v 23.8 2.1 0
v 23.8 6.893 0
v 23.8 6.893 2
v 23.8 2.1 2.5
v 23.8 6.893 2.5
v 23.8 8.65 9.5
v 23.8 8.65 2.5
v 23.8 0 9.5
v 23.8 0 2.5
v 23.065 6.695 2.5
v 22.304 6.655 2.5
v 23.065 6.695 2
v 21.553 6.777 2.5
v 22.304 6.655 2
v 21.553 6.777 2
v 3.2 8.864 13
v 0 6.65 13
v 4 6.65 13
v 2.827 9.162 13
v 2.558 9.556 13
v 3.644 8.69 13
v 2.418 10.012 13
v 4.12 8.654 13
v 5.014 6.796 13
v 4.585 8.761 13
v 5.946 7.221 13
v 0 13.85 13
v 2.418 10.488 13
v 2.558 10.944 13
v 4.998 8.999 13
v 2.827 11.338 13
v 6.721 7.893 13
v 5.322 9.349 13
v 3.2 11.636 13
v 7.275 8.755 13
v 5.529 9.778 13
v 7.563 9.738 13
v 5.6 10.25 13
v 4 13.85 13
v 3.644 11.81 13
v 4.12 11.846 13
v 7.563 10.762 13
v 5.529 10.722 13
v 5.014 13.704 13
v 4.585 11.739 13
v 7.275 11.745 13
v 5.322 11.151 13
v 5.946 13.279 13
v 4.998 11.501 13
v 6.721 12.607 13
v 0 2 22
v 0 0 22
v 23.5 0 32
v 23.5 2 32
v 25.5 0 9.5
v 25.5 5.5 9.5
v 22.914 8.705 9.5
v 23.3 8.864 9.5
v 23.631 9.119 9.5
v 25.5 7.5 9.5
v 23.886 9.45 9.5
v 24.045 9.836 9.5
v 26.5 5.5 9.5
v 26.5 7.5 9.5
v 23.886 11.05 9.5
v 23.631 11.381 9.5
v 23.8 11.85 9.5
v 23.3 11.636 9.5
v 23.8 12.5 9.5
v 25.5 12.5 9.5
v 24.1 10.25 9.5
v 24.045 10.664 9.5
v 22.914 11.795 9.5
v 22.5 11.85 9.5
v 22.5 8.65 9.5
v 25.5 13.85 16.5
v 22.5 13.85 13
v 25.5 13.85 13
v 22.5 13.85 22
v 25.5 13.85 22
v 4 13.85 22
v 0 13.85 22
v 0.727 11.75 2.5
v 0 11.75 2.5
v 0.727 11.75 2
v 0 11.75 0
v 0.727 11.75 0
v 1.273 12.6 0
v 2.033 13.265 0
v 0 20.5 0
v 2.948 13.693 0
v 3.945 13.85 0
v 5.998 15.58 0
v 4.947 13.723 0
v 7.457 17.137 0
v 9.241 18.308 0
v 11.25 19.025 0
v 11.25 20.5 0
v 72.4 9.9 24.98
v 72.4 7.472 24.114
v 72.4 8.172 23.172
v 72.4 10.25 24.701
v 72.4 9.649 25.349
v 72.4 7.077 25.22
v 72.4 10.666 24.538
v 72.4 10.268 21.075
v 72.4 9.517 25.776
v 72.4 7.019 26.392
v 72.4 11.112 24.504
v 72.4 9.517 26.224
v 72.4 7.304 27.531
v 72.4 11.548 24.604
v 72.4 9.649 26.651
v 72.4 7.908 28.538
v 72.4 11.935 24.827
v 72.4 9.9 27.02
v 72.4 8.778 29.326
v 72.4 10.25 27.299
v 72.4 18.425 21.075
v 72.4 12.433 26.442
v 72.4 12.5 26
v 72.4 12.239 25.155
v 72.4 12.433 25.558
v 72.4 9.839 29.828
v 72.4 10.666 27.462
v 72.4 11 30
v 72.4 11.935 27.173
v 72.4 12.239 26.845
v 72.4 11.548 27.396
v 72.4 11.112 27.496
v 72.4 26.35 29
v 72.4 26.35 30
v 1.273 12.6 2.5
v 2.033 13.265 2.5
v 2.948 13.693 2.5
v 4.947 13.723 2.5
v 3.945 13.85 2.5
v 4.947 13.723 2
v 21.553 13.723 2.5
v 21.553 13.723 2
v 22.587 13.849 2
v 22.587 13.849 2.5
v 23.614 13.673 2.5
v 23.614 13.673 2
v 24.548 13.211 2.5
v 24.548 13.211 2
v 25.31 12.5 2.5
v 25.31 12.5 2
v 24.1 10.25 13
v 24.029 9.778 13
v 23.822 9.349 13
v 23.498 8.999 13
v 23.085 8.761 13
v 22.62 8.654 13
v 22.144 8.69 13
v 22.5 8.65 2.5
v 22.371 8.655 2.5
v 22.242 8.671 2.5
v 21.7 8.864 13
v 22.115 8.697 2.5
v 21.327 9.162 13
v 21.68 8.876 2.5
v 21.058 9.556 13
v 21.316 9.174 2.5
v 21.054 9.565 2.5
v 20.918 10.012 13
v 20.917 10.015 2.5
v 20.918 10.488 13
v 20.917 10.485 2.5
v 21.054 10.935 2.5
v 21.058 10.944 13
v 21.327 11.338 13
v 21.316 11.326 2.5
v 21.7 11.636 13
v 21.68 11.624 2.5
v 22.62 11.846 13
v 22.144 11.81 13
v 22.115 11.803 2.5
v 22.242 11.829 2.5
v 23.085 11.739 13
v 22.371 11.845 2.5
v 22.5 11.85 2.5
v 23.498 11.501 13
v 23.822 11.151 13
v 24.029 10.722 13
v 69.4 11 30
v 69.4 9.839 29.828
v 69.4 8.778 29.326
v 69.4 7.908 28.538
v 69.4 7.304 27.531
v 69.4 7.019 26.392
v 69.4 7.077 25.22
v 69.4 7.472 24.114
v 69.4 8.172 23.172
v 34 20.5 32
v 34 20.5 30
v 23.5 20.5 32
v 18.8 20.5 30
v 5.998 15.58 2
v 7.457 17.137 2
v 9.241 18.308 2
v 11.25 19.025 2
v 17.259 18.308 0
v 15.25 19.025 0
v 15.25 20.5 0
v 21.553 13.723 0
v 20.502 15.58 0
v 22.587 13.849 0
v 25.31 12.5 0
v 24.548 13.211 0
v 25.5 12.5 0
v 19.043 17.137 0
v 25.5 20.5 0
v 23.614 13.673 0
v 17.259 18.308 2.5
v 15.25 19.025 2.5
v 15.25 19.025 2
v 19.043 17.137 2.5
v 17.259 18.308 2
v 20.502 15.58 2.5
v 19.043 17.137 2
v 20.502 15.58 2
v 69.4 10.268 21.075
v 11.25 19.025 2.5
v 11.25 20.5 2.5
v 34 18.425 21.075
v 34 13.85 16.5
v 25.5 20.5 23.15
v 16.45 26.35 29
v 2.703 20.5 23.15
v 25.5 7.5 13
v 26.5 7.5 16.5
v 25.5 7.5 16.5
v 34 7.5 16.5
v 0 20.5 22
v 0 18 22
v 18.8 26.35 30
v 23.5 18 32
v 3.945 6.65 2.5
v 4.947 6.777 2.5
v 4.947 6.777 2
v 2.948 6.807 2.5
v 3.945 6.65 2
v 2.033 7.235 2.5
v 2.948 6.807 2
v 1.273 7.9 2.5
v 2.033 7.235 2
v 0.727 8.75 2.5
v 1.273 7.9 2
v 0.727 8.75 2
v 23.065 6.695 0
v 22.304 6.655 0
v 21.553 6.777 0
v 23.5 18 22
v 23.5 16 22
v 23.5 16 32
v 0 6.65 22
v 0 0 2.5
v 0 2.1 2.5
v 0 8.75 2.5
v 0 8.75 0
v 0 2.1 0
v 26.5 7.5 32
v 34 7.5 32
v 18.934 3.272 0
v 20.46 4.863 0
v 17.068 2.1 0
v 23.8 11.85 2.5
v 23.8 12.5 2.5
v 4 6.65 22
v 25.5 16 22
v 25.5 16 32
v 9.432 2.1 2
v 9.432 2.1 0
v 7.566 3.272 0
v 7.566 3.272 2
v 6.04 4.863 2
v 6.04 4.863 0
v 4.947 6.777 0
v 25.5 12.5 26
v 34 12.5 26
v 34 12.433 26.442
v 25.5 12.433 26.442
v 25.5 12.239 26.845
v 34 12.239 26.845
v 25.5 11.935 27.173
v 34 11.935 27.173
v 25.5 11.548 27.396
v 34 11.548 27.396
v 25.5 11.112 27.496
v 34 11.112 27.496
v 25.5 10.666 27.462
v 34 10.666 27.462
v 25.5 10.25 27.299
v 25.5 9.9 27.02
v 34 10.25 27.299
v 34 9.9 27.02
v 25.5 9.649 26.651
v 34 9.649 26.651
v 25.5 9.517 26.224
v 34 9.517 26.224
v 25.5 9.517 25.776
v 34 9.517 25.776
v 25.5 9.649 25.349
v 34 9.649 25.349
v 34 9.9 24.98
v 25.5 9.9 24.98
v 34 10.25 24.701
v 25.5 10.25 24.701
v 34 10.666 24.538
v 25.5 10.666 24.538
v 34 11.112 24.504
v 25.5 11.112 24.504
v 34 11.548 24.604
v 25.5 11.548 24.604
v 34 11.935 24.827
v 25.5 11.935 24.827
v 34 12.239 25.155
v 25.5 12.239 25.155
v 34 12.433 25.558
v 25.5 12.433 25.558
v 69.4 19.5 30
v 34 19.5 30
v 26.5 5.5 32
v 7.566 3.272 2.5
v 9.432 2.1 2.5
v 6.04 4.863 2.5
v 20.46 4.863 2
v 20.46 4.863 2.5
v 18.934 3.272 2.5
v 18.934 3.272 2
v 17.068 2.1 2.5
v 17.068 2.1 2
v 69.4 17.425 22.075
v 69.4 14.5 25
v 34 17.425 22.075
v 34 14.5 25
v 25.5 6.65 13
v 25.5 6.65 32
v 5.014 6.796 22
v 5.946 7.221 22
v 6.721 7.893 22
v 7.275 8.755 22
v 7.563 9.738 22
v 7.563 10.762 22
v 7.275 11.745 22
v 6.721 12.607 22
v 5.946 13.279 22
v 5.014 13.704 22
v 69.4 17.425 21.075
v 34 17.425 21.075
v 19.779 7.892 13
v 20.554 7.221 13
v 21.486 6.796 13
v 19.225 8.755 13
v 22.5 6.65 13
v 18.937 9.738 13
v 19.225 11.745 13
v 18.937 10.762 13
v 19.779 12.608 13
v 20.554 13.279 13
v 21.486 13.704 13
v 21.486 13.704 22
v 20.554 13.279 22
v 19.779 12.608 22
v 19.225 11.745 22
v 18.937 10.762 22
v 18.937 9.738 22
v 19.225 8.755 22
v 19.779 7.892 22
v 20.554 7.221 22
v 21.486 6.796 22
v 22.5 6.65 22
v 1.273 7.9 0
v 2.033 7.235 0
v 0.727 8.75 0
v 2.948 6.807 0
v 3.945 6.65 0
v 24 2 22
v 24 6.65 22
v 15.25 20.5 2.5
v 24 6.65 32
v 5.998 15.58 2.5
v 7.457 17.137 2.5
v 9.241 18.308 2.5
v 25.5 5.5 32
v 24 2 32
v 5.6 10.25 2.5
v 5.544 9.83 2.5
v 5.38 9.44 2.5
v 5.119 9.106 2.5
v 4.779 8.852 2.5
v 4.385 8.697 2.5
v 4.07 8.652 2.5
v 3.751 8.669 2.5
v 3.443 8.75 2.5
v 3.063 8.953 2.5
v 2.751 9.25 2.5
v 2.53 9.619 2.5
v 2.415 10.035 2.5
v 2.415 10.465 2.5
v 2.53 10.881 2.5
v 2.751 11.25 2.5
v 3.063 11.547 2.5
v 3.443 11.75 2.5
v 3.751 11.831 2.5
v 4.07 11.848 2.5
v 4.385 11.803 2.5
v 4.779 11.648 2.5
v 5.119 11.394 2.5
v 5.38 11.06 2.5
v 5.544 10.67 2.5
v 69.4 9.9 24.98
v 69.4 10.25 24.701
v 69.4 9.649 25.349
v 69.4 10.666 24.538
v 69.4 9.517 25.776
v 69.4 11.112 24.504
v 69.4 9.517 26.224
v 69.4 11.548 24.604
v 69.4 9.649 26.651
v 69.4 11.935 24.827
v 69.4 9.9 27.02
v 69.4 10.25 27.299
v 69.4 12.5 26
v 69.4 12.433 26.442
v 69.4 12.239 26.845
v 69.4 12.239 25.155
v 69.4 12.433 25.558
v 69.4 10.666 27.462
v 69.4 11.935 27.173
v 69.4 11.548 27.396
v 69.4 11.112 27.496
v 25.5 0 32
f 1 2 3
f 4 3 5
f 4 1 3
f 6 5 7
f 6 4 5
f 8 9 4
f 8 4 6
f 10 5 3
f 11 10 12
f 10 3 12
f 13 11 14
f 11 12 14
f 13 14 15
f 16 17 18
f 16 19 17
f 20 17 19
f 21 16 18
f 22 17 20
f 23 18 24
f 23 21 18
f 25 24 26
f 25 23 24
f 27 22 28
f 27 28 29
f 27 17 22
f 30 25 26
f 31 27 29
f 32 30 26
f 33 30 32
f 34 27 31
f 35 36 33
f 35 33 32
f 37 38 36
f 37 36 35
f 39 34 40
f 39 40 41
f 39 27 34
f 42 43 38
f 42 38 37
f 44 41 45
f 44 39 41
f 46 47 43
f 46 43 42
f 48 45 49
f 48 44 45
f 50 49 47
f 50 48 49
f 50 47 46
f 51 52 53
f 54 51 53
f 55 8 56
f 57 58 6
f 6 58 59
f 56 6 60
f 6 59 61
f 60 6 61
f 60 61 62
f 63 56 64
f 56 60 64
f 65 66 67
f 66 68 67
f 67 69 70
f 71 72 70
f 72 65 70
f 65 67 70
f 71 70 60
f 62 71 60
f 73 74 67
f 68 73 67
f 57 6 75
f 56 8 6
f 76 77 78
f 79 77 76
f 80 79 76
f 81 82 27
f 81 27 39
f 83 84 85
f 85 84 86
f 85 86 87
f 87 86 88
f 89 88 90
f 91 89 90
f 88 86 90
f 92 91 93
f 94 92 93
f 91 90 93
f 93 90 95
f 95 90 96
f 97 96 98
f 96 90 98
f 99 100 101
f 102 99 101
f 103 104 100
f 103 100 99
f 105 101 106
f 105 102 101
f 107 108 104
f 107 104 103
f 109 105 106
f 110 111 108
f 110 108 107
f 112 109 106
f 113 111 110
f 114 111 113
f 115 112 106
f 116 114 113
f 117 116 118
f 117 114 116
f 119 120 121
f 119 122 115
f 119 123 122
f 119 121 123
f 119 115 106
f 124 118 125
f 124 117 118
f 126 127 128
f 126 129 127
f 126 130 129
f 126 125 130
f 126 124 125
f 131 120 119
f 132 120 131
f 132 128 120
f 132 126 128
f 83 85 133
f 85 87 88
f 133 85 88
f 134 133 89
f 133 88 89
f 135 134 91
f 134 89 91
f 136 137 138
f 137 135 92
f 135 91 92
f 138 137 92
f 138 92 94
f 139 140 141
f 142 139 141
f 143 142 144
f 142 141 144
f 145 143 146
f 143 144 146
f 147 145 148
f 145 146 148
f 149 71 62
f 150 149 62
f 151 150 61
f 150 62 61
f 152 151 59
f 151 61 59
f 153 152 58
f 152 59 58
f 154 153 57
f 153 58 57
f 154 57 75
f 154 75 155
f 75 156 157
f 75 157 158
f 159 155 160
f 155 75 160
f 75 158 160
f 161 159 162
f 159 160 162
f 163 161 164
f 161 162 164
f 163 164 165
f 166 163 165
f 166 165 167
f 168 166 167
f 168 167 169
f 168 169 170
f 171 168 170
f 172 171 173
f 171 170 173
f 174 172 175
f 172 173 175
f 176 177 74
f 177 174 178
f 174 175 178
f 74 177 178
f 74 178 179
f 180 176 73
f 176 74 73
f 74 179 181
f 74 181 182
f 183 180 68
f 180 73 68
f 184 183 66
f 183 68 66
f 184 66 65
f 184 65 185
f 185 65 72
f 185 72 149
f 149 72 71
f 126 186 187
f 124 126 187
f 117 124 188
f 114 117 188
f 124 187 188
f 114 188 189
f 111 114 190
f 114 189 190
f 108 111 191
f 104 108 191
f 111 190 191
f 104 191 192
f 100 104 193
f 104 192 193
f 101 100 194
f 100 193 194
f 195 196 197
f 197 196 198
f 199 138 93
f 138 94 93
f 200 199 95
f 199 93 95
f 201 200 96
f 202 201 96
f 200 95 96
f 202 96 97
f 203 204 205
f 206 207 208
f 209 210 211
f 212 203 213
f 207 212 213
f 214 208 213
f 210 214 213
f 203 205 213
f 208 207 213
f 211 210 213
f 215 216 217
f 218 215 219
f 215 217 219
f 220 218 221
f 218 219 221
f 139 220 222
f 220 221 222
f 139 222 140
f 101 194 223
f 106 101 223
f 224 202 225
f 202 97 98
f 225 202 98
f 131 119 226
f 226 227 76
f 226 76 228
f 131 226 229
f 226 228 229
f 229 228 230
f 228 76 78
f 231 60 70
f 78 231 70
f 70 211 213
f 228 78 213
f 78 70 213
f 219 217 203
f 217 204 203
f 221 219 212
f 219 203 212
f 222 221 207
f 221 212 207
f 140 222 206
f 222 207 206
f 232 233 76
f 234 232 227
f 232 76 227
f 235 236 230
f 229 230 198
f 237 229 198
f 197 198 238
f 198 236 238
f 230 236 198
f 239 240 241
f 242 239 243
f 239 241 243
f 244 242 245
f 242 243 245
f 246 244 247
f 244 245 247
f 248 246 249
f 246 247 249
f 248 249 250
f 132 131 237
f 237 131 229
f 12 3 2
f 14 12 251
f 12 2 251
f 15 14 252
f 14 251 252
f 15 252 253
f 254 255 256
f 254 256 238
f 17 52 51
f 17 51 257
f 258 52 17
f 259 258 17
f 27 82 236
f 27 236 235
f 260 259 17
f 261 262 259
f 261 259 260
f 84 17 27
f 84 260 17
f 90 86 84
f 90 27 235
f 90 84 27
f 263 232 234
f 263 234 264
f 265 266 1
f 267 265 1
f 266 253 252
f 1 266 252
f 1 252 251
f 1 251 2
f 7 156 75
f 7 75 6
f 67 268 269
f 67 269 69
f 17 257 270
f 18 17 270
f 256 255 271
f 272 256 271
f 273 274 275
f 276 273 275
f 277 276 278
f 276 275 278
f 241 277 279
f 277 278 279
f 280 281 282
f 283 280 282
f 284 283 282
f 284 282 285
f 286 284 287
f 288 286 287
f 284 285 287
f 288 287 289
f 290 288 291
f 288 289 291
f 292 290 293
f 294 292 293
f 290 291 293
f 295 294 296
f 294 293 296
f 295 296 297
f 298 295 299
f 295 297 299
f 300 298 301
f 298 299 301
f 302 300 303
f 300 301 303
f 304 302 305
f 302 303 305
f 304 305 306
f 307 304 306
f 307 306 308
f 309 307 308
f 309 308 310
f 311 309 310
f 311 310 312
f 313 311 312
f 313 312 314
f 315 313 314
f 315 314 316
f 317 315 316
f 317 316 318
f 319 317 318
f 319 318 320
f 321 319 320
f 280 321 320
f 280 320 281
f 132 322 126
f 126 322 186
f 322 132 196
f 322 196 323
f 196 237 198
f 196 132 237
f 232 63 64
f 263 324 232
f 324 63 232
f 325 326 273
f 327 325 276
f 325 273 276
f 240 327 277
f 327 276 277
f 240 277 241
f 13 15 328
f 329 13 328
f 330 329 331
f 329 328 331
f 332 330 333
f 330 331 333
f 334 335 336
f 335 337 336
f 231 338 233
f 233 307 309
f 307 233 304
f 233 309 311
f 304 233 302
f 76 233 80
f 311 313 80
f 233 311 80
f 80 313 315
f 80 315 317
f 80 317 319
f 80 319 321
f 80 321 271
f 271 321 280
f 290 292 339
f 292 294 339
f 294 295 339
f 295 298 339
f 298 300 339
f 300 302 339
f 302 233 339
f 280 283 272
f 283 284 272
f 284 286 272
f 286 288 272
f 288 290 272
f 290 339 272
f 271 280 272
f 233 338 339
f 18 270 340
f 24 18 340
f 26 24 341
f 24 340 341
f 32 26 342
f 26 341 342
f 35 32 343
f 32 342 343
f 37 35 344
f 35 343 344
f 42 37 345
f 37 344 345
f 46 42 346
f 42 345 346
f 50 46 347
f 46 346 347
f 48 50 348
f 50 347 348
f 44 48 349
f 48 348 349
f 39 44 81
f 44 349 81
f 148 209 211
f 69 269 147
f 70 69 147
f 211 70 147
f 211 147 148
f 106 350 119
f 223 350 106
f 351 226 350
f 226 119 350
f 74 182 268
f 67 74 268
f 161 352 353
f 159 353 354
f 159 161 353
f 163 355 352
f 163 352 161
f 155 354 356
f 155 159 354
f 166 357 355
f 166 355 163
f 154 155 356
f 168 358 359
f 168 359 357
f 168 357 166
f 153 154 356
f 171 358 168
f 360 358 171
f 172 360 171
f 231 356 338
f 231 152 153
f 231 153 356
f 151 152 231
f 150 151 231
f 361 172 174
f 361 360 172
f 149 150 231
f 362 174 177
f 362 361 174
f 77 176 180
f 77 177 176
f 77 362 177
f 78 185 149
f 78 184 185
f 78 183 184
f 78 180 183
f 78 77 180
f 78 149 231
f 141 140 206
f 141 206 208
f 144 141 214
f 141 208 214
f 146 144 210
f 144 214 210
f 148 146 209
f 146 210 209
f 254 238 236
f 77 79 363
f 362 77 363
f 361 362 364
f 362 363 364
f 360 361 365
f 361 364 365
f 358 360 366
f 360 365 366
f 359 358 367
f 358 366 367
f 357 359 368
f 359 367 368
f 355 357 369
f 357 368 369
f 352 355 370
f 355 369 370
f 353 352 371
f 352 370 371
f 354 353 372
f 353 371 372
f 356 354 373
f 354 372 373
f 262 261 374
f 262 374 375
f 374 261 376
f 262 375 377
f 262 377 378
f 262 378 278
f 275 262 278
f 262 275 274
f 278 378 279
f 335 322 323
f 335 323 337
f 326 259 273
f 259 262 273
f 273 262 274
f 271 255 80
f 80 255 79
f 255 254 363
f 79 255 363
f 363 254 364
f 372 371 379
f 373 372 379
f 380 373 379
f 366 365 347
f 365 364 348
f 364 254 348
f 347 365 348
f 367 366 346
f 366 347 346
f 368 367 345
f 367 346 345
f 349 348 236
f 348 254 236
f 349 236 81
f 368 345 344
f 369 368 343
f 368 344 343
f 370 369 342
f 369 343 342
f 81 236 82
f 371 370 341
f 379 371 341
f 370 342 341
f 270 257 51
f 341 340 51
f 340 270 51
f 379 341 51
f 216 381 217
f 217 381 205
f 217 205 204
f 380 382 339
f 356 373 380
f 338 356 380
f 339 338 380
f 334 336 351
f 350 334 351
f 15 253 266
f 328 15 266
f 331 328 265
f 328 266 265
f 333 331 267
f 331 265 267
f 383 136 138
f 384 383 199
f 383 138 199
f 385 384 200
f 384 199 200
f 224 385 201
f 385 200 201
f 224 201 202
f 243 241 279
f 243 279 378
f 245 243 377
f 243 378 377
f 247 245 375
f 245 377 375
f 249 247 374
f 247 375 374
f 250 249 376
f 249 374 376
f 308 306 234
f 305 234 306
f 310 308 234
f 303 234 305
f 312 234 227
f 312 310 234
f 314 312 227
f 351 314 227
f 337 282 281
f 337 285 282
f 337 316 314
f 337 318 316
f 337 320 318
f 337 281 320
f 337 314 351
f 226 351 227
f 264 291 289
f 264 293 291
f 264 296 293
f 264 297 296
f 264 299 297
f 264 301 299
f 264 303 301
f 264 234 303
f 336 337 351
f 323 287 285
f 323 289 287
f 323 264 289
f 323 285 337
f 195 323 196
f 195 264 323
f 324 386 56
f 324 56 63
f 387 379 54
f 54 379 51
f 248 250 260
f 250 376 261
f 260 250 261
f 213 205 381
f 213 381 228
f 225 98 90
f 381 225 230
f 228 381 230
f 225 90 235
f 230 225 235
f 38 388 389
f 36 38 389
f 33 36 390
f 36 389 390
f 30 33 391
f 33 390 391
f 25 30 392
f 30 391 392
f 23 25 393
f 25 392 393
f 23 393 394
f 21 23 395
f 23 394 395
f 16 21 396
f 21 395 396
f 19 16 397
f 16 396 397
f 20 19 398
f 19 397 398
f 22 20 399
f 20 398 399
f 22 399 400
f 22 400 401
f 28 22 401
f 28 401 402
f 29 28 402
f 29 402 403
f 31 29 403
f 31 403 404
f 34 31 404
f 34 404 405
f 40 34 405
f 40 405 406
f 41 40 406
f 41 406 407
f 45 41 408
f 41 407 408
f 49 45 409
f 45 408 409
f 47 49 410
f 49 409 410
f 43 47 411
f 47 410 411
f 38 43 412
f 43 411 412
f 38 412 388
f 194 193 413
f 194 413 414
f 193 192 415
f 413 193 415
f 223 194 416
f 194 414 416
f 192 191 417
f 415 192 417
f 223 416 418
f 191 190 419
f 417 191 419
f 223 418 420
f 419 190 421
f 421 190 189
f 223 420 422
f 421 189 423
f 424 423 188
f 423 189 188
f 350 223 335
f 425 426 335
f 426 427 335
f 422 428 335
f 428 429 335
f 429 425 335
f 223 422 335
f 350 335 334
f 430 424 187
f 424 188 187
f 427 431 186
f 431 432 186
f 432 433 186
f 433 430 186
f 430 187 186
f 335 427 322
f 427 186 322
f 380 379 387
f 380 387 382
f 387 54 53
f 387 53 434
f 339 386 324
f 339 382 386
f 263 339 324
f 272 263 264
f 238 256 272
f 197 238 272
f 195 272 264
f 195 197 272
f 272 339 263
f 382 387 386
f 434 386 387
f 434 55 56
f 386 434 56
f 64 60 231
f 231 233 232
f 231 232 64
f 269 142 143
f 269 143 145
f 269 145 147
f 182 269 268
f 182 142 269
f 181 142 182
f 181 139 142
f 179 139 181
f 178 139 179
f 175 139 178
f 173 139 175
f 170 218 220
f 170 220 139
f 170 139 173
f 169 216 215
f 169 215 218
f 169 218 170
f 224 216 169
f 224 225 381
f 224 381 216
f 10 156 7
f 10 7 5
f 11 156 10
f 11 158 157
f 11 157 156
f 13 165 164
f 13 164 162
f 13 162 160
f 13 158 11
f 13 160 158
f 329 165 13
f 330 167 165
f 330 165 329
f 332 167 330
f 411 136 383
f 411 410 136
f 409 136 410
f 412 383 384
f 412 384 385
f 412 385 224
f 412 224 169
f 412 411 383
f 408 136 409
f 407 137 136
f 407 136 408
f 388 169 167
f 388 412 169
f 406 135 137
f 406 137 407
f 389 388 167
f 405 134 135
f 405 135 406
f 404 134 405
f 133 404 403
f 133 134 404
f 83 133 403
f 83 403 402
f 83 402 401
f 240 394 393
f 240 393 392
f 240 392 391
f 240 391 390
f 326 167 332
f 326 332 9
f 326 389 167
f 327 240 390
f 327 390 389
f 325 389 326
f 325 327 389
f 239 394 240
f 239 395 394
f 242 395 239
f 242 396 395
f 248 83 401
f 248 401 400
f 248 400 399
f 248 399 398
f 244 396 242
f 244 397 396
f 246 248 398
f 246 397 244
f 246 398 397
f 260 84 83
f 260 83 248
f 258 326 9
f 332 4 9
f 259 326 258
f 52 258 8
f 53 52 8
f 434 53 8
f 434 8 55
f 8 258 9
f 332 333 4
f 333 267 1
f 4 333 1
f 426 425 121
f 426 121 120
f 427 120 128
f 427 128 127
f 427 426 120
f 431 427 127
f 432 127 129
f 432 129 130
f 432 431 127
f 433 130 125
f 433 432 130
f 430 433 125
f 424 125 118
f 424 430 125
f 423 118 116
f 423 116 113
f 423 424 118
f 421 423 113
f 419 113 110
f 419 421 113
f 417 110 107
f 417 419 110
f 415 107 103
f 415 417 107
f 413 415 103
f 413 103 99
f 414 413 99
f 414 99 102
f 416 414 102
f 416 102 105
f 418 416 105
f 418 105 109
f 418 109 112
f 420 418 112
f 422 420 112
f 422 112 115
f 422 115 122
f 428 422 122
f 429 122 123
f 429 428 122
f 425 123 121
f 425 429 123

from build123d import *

# Parameters (mm, degrees)
SKETCH_W           = 25.5
SKETCH_H           = 20.5
PAD_DEPTH          = 32
POCKET_DEPTH       = 20.501
SKETCH002_W        = 25.5
SKETCH002_H        = 2
POCKET001_DEPTH    = 2.1
SKETCH003_W        = 1.7
SKETCH003_H        = 9.5
POCKET002_DEPTH    = 12.5
SKETCH004_R        = 1.6
POCKET003_DEPTH    = 32.001
SKETCH005_R        = 3.6
POCKET004_DEPTH    = 2
SKETCH006_R        = 9
POCKET005_DEPTH    = 2
SKETCH007_R        = 3.6
POCKET006_DEPTH    = 19
SKETCH008_W        = 2.9999909846
SKETCH008_H        = 7.2
POCKET007_DEPTH    = 19
SKETCH009_W        = 2.9999856852
SKETCH009_H        = 3.2
POCKET008_DEPTH    = 7.5
SKETCH010_W        = 13
SKETCH010_H        = 15.5
PAD001_DEPTH       = 8.5
SKETCH011_W        = 16
SKETCH011_H        = 10
POCKET009_DEPTH    = 24
SKETCH012_W        = 4
SKETCH012_H        = 7.2
POCKET010_DEPTH    = 9
SKETCH013_W        = 1.5
SKETCH013_H        = 1.85
PAD002_DEPTH       = 15.5
PAD002_FACE36_W    = 4.15
PAD002_FACE36_H    = 10
POCKET011_DEPTH    = 1.5
SKETCH014_R        = 1.5
POCKET012_DEPTH    = 34.001
POCKET012_FACE43_W = 1.5
POCKET012_FACE43_H = 15.5
POCKET013_DEPTH    = 1.85
SKETCH015_W        = 4
SKETCH015_H        = 4.8
SKETCH015_H_2      = 3
POCKET014_DEPTH    = 2
POCKET015_DEPTH    = 8.5
PAD003_DEPTH       = 25
SKETCH018_W        = 1
SKETCH018_H        = 1
POCKET016_DEPTH    = 25
SKETCH019_W        = 2
SKETCH019_H        = 2
PAD004_DEPTH       = 10
SKETCH020_W        = 1
SKETCH020_H        = 2
PAD005_DEPTH       = 22.5
POCKET017_DEPTH    = 25
PAD006_DEPTH       = 25
PAD007_DEPTH       = 1
POCKET018_DEPTH    = 0.5
PAD008_DEPTH       = 58
POCKET019_DEPTH    = 5.851
PAD009_DEPTH       = 9.4
SKETCH024_R        = 1.5
PAD010_DEPTH       = 3


with BuildPart() as part:
    # Sketch → Pad (new body)
    with BuildSketch(Plane.XY):
        with Locations((12.75, 10.25)):
            Rectangle(SKETCH_W, SKETCH_H)
    extrude(amount=PAD_DEPTH)

    # Sketch001 (on Face1 of Pad) → Pocket (cut, through all)
    with BuildSketch(Plane.XZ):
        Polygon((0, 22), (23.5, 32), (0, 32), align=None)
    extrude(amount=-POCKET_DEPTH, mode=Mode.SUBTRACT)

    # Sketch002 (on Face1 of Pocket) → Pocket001 (cut)
    with BuildSketch(Plane.XZ):
        with Locations((12.75, 1)):
            Rectangle(SKETCH002_W, SKETCH002_H)
    extrude(amount=-POCKET001_DEPTH, mode=Mode.SUBTRACT)

    # Sketch003 (on Face1 of Pocket001) → Pocket002 (cut)
    with BuildSketch(Plane.XZ):
        with Locations((24.65, 4.75)):
            Rectangle(SKETCH003_W, SKETCH003_H)
    extrude(amount=-POCKET002_DEPTH, mode=Mode.SUBTRACT)

    # Sketch004 (on Face10 of Pocket002) → Pocket003 (cut, through all)
    with BuildSketch(Plane(origin=(0, 0, 0), x_dir=(1, 0, 0), z_dir=(0, 0, -1))):
        with Locations((4, -10.25)):
            Circle(SKETCH004_R)
        with Locations((22.5, -10.25)):
            Circle(SKETCH004_R)
    extrude(amount=-POCKET003_DEPTH, mode=Mode.SUBTRACT)

    # Sketch005 (on Face10 of Pocket003) → Pocket004 (cut)
    with BuildSketch(Plane(origin=(0, 0, 0), x_dir=(1, 0, 0), z_dir=(0, 0, -1))):
        with Locations((4, -10.25)):
            Circle(SKETCH005_R)
        with Locations((22.5, -10.25)):
            Circle(SKETCH005_R)
    extrude(amount=-POCKET004_DEPTH, mode=Mode.SUBTRACT)

    # Sketch006 (on Face10 of Pocket004) → Pocket005 (cut)
    with BuildSketch(Plane(origin=(0, 0, 0), x_dir=(1, 0, 0), z_dir=(0, 0, -1))):
        with Locations((13.25, -10.25)):
            Circle(SKETCH006_R)
    extrude(amount=-POCKET005_DEPTH, mode=Mode.SUBTRACT)

    # Sketch007 (on Face5 of Pocket005) → Pocket006 (cut)
    with BuildSketch(Plane.XY.offset(32)):
        with Locations((4, 10.25)):
            Circle(SKETCH007_R)
        with Locations((22.5, 10.25)):
            Circle(SKETCH007_R)
    extrude(amount=-POCKET006_DEPTH, mode=Mode.SUBTRACT)

    # Sketch008 (on Face5 of Pocket006) → Pocket007 (cut)
    with BuildSketch(Plane.XY.offset(32)):
        with Locations((24.0000045077, 10.25)):
            Rectangle(SKETCH008_W, SKETCH008_H)
    extrude(amount=-POCKET007_DEPTH, mode=Mode.SUBTRACT)

    # Sketch009 (on Face8 of Pocket007) → Pocket008 (cut)
    with BuildSketch(Plane(origin=(0, 0, 2), x_dir=(1, 0, 0), z_dir=(0, 0, -1))):
        with Locations((24.0000071574, -10.25)):
            Rectangle(SKETCH009_W, SKETCH009_H)
    extrude(amount=-POCKET008_DEPTH, mode=Mode.SUBTRACT)

    # Sketch010 (on Face3 of Pocket008) → Pad001 (join)
    with BuildSketch(Plane.YZ.offset(25.5)):
        with Locations((14, 24.25)):
            Rectangle(SKETCH010_W, SKETCH010_H)
    extrude(amount=PAD001_DEPTH)

    # Sketch011 (on Face7 of Pad001) → Pocket009 (cut)
    with BuildSketch(Plane(origin=(0, 0, 0), x_dir=(0, -1, 0), z_dir=(-1, 0, 0))):
        with Locations((-10, 27)):
            Rectangle(SKETCH011_W, SKETCH011_H)
    extrude(amount=-POCKET009_DEPTH, mode=Mode.SUBTRACT)

    # Sketch012 (on Face26 of Pocket009) → Pocket010 (cut)
    with BuildSketch(Plane.XY.offset(22)):
        with Locations((2, 10.25)):
            Rectangle(SKETCH012_W, SKETCH012_H)
    extrude(amount=-POCKET010_DEPTH, mode=Mode.SUBTRACT)

    # Sketch013 (on Face36 of Pocket010) → Pad002 (join)
    with BuildSketch(Plane.XY.offset(32)):
        with Locations((24.75, 7.575)):
            Rectangle(SKETCH013_W, SKETCH013_H)
    extrude(amount=-PAD002_DEPTH)

    # Pad002 Face36 → Pocket011 (cut)
    with BuildSketch(Plane(origin=(24, 15.925, 27), x_dir=(0, 1, 0), z_dir=(-1, 0, 0))):
        Rectangle(PAD002_FACE36_W, PAD002_FACE36_H)
    extrude(amount=-POCKET011_DEPTH, mode=Mode.SUBTRACT)

    # Sketch014 (on Face35 of Pocket011) → Pocket012 (cut, through all)
    with BuildSketch(Plane.YZ.offset(34)):
        with Locations((11, 26)):
            Circle(SKETCH014_R)
    extrude(amount=-POCKET012_DEPTH, mode=Mode.SUBTRACT)

    # Pocket012 Face43 → Pocket013 (cut)
    with BuildSketch(Plane(origin=(24.75, 8.5, 24.25), x_dir=(1, 0, 0), z_dir=(0, 1, 0))):
        Rectangle(POCKET012_FACE43_W, POCKET012_FACE43_H)
    extrude(amount=-POCKET013_DEPTH, mode=Mode.SUBTRACT)

    # Sketch015 (on Face2 of Pocket013) → Pocket014 (cut)
    with BuildSketch(Plane(origin=(0, 0, 0), x_dir=(1, 0, 0), z_dir=(0, 0, -1))):
        with Locations((13.25, -18.1)):
            Rectangle(SKETCH015_W, SKETCH015_H)
        with Locations((2, -10.25)):
            Rectangle(SKETCH015_W, SKETCH015_H_2)
    extrude(amount=-POCKET014_DEPTH, mode=Mode.SUBTRACT)

    # Sketch016 (on Face45 of Pocket014) → Pocket015 (cut)
    with BuildSketch(Plane.YZ.offset(34)):
        Polygon((13.85, 16.5), (20.5, 23.15), (20.5, 16.5), align=None)
    extrude(amount=-POCKET015_DEPTH, mode=Mode.SUBTRACT)

    # Sketch017 (on Face46 of Pocket015) → Pad003 (join)
    with BuildSketch(Plane.YZ.offset(34)):
        Polygon((20.5, 31), (14.5, 25), (14.5, 17.15), (20.5, 23.15), align=None)
    extrude(amount=PAD003_DEPTH)

    # Sketch018 (on Face53 of Pad003) → Pocket016 (cut)
    with BuildSketch(Plane.YZ.offset(59)):
        with Locations((20, 30.5)):
            Rectangle(SKETCH018_W, SKETCH018_H)
        with Locations((15, 17.65)):
            Rectangle(SKETCH018_W, SKETCH018_H)
    extrude(amount=-POCKET016_DEPTH, mode=Mode.SUBTRACT)

    # Sketch019 (on Face45 of Pocket016) → Pad004 (join)
    with BuildSketch(Plane.XY.offset(32)):
        with Locations((24.5, 17)):
            Rectangle(SKETCH019_W, SKETCH019_H)
    extrude(amount=-PAD004_DEPTH)

    # Sketch020 (on Face60 of Pad004) → Pad005 (join)
    with BuildSketch(Plane.XY.offset(32)):
        with Locations((26, 6.5)):
            Rectangle(SKETCH020_W, SKETCH020_H)
    extrude(amount=-PAD005_DEPTH)

    # Sketch021 (on Face46 of Pad005) → Pocket017 (cut)
    with BuildSketch(Plane.YZ.offset(59)):
        Polygon((14.5, 25), (18.425, 21.075), (14.5, 17.15), align=None)
    extrude(amount=-POCKET017_DEPTH, mode=Mode.SUBTRACT)

    # Sketch022 (on Face49 of Pocket017) → Pad006 (join)
    with BuildSketch(Plane.YZ.offset(59)):
        Polygon((18.425, 21.075), (17.425, 21.075), (17.425, 22.075), align=None)
    extrude(amount=-PAD006_DEPTH)

    # Pad006 Face64 → Pad007 (add)
    with BuildSketch(Plane(origin=(59, 18.28427215, 25.3924064799), x_dir=(0, -1, 0), z_dir=(1, 0, 0))):
        Polygon((-2.21572785, -4.6075935201), (-1.21572785, -4.6075935201), (3.78427215, 0.3924064799), (0.85927215, 3.3174064799), (0.85927215, 4.3174064799), (-0.14072785, 4.3174064799), (-2.21572785, 2.2424064799), align=None)
    extrude(amount=PAD007_DEPTH)

    # Pad007 Face4 → Pocket018 (cut)
    with BuildSketch(Plane(origin=(12.6211473302, 9.1246275662, 2), x_dir=(0, -1, 0), z_dir=(0, 0, -1))):
        with BuildLine():
            Line((0.3746275662, 12.6211473302), (-2.6253724338, 12.6211473302))
            Line((-2.6253724338, 12.6211473302), (-2.6253724338, 11.8937609646))
            ThreePointArc((-2.6253724338, 11.8937609646), (-4.3864646733, 10.1460333605), (-4.5985386893, 7.6739851681))
            ThreePointArc((-4.5985386893, 7.6739851681), (-8.0127244114, 5.1646249332), (-9.9003368212, 1.3711473302))
            Line((-9.9003368212, 1.3711473302), (-11.3753724338, 1.3711473302))
            Line((-11.3753724338, 1.3711473302), (-11.3753724338, -2.6288526698))
            Line((-11.3753724338, -2.6288526698), (-9.9003368212, -2.6288526698))
            ThreePointArc((-9.9003368212, -2.6288526698), (-8.0127244114, -6.4223302727), (-4.5985386893, -8.9316905076))
            ThreePointArc((-4.5985386893, -8.9316905076), (-4.5485570394, -10.9932166839), (-3.3753724338, -12.6891017691))
            Line((-3.3753724338, -12.6891017691), (-3.3753724338, -11.1788526698))
            Line((-3.3753724338, -11.1788526698), (-2.7253724338, -11.1788526698))
            Line((-2.7253724338, -11.1788526698), (-2.7253724338, -9.8788669846))
            ThreePointArc((-2.7253724337, -9.8788669846), (-2.71357708, -9.6849300003), (-2.6783614872, -9.4938526698))
            ThreePointArc((-2.6783614872, -9.4938526698), (-1.1253724338, -8.2788526698), (0.4276166196, -9.4938526698))
            ThreePointArc((0.4276166196, -9.4938526698), (0.4628322125, -9.6849300003), (0.4746275662, -9.8788669846))
            Line((0.4746275662, -9.8788669846), (0.4746275662, -11.1788526698))
            Line((0.4746275662, -11.1788526698), (2.2317096326, -11.1788526698))
            ThreePointArc((2.2317096326, -11.1788526698), (2.4698337467, -10.0645742886), (2.3477938218, -8.9316905076))
            ThreePointArc((2.3477938218, -8.9316905076), (5.1038193792, -7.124787503), (7.0246275662, -4.4469019099))
            Line((7.0246275662, -4.4469019099), (7.0246275662, -11.1788526698))
            Line((7.0246275662, -11.1788526698), (9.1246275662, -11.1788526698))
            Line((9.1246275662, -11.1788526698), (9.1246275662, 12.6211473302))
            Line((9.1246275662, 12.6211473302), (7.0246275662, 12.6211473302))
            Line((7.0246275662, 12.6211473302), (7.0246275662, 3.1891965703))
            ThreePointArc((7.0246275662, 3.1891965703), (5.1038193792, 5.8670821634), (2.3477938218, 7.6739851681))
            ThreePointArc((2.3477938218, 7.6739851681), (2.1357198057, 10.1460333605), (0.3746275662, 11.8937609646))
            Line((0.3746275662, 11.8937609646), (0.3746275662, 12.6211473302))
        make_face()
        with BuildLine():
            ThreePointArc((-2.6253724338, 9.1779237665), (-1.1253724338, 10.2211473302), (0.3746275662, 9.1779237665))
            ThreePointArc((0.3746275662, 9.1779237665), (0.4721009632, 8.7110291747), (0.4276166196, 8.2361473302))
            ThreePointArc((0.4276166196, 8.2361473302), (-0.1394718303, 7.3609886101), (-1.1253724338, 7.0211473302))
            ThreePointArc((-1.1253724338, 7.0211473302), (-2.1112730373, 7.3609886101), (-2.6783614872, 8.2361473302))
            ThreePointArc((-2.6783614872, 8.2361473302), (-2.7228458307, 8.7110291747), (-2.6253724338, 9.1779237665))
        make_face(mode=Mode.SUBTRACT)
    extrude(amount=-POCKET018_DEPTH, mode=Mode.SUBTRACT)

    # Sketch023 (on Face35 of Pocket018) → Pad008 (join)
    with BuildSketch(Plane.YZ.offset(60)):
        Polygon((20.5, 23.15), (26.35, 29), (26.35, 30), (20.5, 30), align=None)
    extrude(amount=-PAD008_DEPTH)

    # Pad008 Face47 → Pocket019 (cut, through all)
    with BuildSketch(Plane(origin=(7.6093987764, 20.5, 27.6250202352), x_dir=(-1, 0, 0), z_dir=(0, -1, 0))):
        Polygon((4.9068987764, 4.4750202352), (-11.1906012236, -2.3749797648), (5.6093987764, -2.3749797648), (5.6093987764, 4.4750202352), align=None)
    extrude(amount=-POCKET019_DEPTH, mode=Mode.SUBTRACT)

    # Pocket019 Face62 → Pad009 (add)
    with BuildSketch(Plane(origin=(60, 20.1386845476, 26.3510071585), x_dir=(0, -1, 0), z_dir=(1, 0, 0))):
        Polygon((1.7136845476, 5.2760071585), (-6.2113154524, -2.6489928415), (-6.2113154524, -3.6489928415), (0.6386845476, -3.6489928415), (5.6386845476, 1.3510071585), (2.7136845476, 4.2760071585), (2.7136845476, 5.2760071585), align=None)
    extrude(amount=PAD009_DEPTH)

    # Sketch024 (on Face60 of Pad009) → Pad010 (join)
    with BuildSketch(Plane.YZ.offset(69.4)):
        with BuildLine():
            ThreePointArc((11, 30), (7.30448187, 27.5307337295), (8.1715728753, 23.1715728753))
            Line((8.1715728753, 23.1715728753), (10.2681457504, 21.075))
            Line((18.425, 21.075), (10.2681457504, 21.075))
            Line((18.425, 21.075), (26.35, 29))
            Line((26.35, 29), (26.35, 30))
            Line((26.35, 30), (20.5, 30))
            Line((20.5, 30), (11, 30))
        make_face()
        with Locations((11, 26)):
            Circle(SKETCH024_R, mode=Mode.SUBTRACT)
    extrude(amount=PAD010_DEPTH)


solid = part.part
